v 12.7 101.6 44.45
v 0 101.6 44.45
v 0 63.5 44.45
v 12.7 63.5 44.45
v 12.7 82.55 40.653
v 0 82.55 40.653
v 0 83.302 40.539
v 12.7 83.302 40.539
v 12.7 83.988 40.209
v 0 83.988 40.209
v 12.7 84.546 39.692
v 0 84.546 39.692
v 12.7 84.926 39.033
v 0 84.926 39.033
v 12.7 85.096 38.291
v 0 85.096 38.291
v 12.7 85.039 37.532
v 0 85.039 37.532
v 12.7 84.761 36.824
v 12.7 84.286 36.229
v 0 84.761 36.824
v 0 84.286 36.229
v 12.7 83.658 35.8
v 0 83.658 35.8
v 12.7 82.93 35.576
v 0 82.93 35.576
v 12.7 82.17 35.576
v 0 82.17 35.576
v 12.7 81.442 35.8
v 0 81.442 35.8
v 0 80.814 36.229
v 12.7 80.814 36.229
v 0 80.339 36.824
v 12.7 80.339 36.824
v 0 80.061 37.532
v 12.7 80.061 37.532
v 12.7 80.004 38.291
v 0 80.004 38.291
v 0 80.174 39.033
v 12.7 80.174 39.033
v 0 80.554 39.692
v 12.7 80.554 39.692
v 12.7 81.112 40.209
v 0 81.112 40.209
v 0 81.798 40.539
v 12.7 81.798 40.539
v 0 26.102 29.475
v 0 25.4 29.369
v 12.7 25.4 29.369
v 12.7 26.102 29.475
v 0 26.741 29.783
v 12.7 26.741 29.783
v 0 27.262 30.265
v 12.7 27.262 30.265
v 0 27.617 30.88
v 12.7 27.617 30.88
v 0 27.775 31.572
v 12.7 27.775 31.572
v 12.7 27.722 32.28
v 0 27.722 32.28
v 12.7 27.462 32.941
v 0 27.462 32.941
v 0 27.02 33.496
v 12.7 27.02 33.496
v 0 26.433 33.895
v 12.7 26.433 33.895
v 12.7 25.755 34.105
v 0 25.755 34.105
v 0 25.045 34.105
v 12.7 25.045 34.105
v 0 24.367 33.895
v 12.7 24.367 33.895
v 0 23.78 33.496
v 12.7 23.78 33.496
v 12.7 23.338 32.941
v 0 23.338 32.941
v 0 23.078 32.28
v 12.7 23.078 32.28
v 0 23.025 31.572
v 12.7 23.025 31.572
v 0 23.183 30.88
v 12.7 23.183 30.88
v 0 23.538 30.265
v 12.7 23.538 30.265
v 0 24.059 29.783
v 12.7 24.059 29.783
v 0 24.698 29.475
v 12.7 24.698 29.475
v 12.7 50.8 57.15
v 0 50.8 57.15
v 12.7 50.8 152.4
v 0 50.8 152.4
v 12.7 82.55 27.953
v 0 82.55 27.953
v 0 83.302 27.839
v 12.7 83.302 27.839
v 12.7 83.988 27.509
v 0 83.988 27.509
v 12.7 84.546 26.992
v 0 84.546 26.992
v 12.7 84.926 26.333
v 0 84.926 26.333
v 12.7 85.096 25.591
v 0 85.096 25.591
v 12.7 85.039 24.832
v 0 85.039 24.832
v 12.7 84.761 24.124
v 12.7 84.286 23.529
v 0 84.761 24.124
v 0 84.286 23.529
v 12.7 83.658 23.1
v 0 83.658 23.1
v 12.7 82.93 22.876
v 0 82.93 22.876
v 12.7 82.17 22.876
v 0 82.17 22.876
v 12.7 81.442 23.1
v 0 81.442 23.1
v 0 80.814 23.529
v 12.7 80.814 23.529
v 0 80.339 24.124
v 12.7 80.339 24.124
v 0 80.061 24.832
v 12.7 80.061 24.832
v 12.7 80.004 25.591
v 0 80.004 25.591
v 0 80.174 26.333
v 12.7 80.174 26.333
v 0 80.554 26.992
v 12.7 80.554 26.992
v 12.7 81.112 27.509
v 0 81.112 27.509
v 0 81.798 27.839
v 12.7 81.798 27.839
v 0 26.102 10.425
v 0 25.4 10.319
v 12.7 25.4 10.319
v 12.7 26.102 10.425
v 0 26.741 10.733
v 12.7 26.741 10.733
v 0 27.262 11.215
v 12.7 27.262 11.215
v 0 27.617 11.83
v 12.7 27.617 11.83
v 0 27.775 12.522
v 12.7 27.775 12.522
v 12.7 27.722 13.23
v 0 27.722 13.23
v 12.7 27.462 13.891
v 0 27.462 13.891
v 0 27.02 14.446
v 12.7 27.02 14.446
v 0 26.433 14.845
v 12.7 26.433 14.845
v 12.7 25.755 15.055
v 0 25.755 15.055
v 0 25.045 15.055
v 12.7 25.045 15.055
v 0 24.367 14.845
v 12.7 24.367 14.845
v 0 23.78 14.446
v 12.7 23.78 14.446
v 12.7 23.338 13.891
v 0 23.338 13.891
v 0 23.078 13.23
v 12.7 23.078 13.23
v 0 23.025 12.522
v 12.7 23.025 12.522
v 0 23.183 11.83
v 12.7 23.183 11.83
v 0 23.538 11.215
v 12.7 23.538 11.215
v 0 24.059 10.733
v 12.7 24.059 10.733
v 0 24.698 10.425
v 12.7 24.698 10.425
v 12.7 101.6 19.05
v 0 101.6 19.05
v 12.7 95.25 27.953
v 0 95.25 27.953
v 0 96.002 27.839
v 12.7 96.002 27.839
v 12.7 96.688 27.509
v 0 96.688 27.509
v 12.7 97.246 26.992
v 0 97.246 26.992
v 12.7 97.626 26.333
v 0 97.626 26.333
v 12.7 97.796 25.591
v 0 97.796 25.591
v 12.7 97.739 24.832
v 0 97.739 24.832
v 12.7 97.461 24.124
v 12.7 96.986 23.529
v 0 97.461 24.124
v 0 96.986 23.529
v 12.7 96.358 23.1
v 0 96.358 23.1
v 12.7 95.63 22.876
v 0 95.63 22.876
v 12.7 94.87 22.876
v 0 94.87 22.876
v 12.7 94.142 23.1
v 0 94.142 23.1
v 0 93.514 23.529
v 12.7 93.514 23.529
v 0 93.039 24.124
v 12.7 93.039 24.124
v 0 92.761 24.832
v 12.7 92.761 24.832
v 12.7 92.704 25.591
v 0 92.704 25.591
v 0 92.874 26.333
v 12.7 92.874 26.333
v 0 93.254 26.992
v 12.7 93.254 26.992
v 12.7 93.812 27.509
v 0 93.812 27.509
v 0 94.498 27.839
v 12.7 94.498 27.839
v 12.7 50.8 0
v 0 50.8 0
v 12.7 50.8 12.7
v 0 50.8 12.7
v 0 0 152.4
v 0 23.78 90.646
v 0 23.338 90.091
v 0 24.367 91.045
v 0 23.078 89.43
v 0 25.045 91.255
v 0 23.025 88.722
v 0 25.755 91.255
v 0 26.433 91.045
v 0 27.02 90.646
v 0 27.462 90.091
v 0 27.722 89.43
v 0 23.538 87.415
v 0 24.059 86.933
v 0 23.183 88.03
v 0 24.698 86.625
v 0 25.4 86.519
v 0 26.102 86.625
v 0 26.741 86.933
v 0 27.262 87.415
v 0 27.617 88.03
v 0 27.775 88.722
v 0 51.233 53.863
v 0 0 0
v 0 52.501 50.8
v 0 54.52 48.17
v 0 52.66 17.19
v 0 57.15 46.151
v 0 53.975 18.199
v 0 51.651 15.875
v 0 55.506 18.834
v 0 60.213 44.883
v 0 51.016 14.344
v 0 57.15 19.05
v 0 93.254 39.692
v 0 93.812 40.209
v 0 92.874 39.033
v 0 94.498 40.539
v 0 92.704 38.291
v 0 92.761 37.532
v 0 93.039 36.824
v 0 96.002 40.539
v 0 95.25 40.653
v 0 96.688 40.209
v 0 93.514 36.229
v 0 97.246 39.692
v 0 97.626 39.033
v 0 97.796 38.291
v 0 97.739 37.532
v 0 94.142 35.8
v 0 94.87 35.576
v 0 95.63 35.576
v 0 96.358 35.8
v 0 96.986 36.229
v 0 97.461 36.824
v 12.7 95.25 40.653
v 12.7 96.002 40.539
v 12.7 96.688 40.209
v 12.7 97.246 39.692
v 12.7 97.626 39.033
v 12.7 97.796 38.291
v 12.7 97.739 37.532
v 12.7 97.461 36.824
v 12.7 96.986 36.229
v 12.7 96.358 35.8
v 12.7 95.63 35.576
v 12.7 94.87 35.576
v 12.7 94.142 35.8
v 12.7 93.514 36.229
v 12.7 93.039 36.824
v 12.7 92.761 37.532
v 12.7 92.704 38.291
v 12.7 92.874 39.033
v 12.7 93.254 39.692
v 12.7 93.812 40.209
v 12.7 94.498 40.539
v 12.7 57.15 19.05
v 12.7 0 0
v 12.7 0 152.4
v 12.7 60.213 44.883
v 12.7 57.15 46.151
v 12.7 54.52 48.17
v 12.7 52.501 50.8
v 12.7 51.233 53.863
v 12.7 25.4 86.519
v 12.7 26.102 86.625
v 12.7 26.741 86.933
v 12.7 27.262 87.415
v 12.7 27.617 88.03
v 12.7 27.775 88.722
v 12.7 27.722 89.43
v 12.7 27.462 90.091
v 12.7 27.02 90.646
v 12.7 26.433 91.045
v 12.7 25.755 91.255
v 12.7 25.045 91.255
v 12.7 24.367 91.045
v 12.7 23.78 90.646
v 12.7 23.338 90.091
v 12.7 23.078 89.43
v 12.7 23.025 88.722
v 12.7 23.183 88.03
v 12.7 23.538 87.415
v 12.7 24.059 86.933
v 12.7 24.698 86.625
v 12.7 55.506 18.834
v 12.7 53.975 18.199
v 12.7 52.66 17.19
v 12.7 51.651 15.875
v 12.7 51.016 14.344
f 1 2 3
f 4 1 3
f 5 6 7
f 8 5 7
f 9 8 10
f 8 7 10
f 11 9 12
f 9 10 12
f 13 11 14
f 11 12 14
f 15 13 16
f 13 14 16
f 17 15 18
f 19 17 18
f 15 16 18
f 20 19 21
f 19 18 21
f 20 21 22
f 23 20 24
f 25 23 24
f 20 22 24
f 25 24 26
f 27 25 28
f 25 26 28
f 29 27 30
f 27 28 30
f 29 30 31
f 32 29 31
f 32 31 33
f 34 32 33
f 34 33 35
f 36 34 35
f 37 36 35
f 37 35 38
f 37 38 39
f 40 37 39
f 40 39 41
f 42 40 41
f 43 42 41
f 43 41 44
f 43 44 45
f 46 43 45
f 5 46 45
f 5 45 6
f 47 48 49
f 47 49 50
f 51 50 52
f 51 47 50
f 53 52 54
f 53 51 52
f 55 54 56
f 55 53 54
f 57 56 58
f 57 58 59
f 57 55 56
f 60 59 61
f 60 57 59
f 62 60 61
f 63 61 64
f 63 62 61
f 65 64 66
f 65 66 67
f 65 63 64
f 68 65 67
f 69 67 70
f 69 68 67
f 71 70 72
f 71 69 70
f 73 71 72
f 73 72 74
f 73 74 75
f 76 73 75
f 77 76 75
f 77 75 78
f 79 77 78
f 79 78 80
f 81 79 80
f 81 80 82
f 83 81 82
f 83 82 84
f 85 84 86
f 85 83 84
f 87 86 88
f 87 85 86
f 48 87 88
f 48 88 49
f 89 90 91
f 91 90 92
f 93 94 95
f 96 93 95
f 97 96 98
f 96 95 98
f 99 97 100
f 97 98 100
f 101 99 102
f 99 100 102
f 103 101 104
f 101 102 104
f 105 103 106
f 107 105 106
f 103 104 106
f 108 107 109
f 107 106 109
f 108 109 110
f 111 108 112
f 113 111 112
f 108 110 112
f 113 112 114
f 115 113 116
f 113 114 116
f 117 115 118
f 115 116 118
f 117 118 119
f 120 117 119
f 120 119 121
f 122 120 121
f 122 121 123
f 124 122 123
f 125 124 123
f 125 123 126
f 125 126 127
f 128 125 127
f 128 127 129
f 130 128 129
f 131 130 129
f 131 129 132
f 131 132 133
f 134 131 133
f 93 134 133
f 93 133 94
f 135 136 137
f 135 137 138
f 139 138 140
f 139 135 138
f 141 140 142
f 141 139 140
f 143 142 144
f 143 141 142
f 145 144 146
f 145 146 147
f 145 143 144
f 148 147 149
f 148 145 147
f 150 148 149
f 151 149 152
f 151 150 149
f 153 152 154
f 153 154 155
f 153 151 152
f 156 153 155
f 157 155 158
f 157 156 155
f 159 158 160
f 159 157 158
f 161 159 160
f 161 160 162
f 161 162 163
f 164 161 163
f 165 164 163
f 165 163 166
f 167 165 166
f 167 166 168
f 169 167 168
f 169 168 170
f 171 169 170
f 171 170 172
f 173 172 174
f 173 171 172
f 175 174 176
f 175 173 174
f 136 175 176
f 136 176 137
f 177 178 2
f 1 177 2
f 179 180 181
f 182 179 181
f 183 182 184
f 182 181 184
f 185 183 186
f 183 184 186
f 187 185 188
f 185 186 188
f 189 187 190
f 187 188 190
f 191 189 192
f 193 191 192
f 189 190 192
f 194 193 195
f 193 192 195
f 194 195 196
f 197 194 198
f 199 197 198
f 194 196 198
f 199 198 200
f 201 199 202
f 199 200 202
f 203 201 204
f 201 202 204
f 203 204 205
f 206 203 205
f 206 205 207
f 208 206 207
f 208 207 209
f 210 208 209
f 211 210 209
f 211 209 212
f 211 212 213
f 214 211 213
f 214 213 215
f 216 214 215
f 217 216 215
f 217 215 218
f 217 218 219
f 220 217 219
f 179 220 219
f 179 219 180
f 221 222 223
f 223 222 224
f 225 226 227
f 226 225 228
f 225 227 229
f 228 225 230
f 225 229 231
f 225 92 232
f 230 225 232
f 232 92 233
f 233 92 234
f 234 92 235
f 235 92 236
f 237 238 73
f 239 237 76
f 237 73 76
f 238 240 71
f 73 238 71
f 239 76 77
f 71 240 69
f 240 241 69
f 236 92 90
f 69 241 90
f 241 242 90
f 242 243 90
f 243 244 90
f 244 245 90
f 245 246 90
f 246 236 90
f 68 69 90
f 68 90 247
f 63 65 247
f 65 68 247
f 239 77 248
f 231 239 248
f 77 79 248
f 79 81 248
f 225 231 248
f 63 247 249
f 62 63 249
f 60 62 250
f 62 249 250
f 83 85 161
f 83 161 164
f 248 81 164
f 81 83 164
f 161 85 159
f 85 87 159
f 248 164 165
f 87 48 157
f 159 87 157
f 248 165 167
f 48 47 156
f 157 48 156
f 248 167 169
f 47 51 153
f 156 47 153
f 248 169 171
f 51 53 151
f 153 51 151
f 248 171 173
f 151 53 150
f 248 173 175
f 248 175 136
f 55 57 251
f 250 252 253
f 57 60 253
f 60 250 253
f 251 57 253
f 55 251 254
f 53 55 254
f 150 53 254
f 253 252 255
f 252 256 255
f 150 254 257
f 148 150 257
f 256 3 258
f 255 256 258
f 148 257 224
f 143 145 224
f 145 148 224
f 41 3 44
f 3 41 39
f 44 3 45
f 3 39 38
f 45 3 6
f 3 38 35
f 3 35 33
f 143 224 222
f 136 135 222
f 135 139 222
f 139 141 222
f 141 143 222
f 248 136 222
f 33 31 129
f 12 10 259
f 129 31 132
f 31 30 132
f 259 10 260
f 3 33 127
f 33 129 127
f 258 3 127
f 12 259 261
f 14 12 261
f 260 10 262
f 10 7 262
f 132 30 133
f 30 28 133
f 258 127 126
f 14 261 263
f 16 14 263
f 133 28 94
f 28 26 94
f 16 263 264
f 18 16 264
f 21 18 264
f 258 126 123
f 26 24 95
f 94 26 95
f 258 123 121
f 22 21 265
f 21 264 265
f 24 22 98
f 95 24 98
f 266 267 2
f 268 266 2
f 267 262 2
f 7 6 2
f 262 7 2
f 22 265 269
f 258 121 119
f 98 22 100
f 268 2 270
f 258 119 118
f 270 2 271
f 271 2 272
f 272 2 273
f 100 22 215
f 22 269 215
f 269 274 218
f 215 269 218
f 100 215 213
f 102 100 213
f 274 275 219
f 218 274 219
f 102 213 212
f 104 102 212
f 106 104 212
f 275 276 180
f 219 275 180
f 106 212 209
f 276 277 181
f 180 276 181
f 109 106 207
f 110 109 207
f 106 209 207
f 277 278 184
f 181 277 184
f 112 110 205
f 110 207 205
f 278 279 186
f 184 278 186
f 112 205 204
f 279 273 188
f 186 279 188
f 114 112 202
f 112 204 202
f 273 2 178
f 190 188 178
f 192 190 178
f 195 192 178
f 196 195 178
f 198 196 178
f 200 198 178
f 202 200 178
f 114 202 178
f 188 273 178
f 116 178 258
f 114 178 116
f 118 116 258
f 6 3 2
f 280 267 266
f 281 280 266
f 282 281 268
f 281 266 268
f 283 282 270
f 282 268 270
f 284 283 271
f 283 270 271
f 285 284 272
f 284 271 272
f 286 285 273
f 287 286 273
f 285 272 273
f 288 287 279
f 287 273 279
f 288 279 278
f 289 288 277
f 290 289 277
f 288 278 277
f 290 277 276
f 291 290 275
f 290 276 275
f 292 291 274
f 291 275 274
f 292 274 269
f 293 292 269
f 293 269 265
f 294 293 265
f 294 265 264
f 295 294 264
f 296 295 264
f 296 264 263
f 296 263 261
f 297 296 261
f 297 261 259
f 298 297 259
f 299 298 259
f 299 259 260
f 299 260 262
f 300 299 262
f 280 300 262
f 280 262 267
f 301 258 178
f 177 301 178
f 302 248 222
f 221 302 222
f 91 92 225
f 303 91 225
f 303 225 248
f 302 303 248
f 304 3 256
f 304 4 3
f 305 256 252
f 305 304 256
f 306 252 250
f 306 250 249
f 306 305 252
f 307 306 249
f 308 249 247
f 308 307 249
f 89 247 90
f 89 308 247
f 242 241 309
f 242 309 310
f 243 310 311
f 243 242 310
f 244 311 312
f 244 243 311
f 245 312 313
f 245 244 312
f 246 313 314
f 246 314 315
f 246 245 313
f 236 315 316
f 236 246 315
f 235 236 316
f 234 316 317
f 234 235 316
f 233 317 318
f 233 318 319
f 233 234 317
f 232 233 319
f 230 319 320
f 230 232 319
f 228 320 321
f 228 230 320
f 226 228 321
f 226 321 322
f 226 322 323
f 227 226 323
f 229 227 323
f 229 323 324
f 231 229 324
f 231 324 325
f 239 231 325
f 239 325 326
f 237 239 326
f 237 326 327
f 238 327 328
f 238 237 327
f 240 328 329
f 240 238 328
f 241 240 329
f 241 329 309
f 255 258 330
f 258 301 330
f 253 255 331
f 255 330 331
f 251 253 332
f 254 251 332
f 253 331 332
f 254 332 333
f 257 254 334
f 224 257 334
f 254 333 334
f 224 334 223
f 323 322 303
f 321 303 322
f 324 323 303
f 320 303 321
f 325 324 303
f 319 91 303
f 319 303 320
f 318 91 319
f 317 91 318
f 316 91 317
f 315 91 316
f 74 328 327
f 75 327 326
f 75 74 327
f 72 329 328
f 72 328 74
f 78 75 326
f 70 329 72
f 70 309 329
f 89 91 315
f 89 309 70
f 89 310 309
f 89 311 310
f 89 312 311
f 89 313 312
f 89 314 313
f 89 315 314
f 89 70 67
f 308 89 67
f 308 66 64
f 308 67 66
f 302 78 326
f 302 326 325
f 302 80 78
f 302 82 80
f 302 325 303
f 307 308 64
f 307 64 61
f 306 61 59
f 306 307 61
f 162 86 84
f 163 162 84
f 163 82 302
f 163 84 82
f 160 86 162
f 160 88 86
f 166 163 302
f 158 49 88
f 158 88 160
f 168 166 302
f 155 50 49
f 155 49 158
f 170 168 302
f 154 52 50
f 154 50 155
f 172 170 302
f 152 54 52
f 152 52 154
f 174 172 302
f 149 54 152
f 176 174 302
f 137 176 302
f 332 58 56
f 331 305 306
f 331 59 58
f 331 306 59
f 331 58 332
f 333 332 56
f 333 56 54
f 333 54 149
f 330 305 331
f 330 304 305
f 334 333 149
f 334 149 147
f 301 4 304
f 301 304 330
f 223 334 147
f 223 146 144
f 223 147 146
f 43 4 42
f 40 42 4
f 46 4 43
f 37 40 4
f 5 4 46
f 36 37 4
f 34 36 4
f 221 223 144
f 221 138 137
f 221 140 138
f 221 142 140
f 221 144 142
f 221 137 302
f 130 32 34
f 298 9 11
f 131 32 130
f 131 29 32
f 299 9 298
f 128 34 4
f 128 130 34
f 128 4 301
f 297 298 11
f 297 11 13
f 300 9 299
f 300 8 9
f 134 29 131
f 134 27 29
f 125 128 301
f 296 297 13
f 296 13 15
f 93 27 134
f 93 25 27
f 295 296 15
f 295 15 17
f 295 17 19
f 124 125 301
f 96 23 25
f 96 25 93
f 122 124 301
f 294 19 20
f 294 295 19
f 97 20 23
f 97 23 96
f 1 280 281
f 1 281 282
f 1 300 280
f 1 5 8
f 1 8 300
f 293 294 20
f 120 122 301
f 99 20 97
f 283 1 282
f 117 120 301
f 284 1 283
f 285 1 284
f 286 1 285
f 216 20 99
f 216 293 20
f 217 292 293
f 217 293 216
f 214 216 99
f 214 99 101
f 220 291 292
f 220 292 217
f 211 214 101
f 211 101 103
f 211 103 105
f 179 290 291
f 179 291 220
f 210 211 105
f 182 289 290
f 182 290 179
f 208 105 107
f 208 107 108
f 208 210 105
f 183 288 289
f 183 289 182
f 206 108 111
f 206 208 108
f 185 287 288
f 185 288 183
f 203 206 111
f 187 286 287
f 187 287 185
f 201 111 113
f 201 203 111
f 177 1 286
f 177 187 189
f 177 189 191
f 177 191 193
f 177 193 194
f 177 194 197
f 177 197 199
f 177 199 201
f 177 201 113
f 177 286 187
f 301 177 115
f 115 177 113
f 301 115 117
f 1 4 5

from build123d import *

# Parameters (mm, degrees)
SKETCH1_R              = 2.38125
BOSS_EXTRUDE1_DEPTH    = 12.7
F_10_CLEARANCE_HOLE1_D = 5.1054
FILLET1_R              = 12.7
FILLET2_R              = 6.35


with BuildPart() as part:
    # Sketch1 → Boss-Extrude1 (new body)
    with BuildSketch(Plane(origin=(0, 0, 0), x_dir=(0, 0, -1), z_dir=(1, 0, 0))):
        Polygon((-19.05, 101.6), (-44.45, 101.6), (-44.45, 50.8), (-152.4, 50.8), (-152.4, 0), (0, 0), (0, 50.8), (-19.05, 50.8), align=None)
        with Locations((-88.9, 25.4)):
            Circle(SKETCH1_R, mode=Mode.SUBTRACT)
        with Locations((-31.75, 25.4)):
            Circle(SKETCH1_R, mode=Mode.SUBTRACT)
        with Locations((-12.7, 25.4)):
            Circle(SKETCH1_R, mode=Mode.SUBTRACT)
    extrude(amount=BOSS_EXTRUDE1_DEPTH)

    # #10 Clearance Hole1 (through all)
    with Locations(Plane(origin=(12.7, 0, 0), x_dir=(0, 0, -1), z_dir=(1, 0, 0))):
        with Locations((-38.1, 95.25), (-25.4, 95.25), (-25.4, 82.55), (-38.1, 82.55)):
            Hole(F_10_CLEARANCE_HOLE1_D / 2)

    # Fillet1
    fillet1_edges = [part.edges().sort_by_distance(p)[0] for p in [
        (6.35, 50.8, 44.45),
    ]]
    fillet(fillet1_edges, radius=FILLET1_R)

    # Fillet2
    fillet2_edges = [part.edges().sort_by_distance(p)[0] for p in [
        (6.35, 50.8, 19.05),
    ]]
    fillet(fillet2_edges, radius=FILLET2_R)


solid = part.part
